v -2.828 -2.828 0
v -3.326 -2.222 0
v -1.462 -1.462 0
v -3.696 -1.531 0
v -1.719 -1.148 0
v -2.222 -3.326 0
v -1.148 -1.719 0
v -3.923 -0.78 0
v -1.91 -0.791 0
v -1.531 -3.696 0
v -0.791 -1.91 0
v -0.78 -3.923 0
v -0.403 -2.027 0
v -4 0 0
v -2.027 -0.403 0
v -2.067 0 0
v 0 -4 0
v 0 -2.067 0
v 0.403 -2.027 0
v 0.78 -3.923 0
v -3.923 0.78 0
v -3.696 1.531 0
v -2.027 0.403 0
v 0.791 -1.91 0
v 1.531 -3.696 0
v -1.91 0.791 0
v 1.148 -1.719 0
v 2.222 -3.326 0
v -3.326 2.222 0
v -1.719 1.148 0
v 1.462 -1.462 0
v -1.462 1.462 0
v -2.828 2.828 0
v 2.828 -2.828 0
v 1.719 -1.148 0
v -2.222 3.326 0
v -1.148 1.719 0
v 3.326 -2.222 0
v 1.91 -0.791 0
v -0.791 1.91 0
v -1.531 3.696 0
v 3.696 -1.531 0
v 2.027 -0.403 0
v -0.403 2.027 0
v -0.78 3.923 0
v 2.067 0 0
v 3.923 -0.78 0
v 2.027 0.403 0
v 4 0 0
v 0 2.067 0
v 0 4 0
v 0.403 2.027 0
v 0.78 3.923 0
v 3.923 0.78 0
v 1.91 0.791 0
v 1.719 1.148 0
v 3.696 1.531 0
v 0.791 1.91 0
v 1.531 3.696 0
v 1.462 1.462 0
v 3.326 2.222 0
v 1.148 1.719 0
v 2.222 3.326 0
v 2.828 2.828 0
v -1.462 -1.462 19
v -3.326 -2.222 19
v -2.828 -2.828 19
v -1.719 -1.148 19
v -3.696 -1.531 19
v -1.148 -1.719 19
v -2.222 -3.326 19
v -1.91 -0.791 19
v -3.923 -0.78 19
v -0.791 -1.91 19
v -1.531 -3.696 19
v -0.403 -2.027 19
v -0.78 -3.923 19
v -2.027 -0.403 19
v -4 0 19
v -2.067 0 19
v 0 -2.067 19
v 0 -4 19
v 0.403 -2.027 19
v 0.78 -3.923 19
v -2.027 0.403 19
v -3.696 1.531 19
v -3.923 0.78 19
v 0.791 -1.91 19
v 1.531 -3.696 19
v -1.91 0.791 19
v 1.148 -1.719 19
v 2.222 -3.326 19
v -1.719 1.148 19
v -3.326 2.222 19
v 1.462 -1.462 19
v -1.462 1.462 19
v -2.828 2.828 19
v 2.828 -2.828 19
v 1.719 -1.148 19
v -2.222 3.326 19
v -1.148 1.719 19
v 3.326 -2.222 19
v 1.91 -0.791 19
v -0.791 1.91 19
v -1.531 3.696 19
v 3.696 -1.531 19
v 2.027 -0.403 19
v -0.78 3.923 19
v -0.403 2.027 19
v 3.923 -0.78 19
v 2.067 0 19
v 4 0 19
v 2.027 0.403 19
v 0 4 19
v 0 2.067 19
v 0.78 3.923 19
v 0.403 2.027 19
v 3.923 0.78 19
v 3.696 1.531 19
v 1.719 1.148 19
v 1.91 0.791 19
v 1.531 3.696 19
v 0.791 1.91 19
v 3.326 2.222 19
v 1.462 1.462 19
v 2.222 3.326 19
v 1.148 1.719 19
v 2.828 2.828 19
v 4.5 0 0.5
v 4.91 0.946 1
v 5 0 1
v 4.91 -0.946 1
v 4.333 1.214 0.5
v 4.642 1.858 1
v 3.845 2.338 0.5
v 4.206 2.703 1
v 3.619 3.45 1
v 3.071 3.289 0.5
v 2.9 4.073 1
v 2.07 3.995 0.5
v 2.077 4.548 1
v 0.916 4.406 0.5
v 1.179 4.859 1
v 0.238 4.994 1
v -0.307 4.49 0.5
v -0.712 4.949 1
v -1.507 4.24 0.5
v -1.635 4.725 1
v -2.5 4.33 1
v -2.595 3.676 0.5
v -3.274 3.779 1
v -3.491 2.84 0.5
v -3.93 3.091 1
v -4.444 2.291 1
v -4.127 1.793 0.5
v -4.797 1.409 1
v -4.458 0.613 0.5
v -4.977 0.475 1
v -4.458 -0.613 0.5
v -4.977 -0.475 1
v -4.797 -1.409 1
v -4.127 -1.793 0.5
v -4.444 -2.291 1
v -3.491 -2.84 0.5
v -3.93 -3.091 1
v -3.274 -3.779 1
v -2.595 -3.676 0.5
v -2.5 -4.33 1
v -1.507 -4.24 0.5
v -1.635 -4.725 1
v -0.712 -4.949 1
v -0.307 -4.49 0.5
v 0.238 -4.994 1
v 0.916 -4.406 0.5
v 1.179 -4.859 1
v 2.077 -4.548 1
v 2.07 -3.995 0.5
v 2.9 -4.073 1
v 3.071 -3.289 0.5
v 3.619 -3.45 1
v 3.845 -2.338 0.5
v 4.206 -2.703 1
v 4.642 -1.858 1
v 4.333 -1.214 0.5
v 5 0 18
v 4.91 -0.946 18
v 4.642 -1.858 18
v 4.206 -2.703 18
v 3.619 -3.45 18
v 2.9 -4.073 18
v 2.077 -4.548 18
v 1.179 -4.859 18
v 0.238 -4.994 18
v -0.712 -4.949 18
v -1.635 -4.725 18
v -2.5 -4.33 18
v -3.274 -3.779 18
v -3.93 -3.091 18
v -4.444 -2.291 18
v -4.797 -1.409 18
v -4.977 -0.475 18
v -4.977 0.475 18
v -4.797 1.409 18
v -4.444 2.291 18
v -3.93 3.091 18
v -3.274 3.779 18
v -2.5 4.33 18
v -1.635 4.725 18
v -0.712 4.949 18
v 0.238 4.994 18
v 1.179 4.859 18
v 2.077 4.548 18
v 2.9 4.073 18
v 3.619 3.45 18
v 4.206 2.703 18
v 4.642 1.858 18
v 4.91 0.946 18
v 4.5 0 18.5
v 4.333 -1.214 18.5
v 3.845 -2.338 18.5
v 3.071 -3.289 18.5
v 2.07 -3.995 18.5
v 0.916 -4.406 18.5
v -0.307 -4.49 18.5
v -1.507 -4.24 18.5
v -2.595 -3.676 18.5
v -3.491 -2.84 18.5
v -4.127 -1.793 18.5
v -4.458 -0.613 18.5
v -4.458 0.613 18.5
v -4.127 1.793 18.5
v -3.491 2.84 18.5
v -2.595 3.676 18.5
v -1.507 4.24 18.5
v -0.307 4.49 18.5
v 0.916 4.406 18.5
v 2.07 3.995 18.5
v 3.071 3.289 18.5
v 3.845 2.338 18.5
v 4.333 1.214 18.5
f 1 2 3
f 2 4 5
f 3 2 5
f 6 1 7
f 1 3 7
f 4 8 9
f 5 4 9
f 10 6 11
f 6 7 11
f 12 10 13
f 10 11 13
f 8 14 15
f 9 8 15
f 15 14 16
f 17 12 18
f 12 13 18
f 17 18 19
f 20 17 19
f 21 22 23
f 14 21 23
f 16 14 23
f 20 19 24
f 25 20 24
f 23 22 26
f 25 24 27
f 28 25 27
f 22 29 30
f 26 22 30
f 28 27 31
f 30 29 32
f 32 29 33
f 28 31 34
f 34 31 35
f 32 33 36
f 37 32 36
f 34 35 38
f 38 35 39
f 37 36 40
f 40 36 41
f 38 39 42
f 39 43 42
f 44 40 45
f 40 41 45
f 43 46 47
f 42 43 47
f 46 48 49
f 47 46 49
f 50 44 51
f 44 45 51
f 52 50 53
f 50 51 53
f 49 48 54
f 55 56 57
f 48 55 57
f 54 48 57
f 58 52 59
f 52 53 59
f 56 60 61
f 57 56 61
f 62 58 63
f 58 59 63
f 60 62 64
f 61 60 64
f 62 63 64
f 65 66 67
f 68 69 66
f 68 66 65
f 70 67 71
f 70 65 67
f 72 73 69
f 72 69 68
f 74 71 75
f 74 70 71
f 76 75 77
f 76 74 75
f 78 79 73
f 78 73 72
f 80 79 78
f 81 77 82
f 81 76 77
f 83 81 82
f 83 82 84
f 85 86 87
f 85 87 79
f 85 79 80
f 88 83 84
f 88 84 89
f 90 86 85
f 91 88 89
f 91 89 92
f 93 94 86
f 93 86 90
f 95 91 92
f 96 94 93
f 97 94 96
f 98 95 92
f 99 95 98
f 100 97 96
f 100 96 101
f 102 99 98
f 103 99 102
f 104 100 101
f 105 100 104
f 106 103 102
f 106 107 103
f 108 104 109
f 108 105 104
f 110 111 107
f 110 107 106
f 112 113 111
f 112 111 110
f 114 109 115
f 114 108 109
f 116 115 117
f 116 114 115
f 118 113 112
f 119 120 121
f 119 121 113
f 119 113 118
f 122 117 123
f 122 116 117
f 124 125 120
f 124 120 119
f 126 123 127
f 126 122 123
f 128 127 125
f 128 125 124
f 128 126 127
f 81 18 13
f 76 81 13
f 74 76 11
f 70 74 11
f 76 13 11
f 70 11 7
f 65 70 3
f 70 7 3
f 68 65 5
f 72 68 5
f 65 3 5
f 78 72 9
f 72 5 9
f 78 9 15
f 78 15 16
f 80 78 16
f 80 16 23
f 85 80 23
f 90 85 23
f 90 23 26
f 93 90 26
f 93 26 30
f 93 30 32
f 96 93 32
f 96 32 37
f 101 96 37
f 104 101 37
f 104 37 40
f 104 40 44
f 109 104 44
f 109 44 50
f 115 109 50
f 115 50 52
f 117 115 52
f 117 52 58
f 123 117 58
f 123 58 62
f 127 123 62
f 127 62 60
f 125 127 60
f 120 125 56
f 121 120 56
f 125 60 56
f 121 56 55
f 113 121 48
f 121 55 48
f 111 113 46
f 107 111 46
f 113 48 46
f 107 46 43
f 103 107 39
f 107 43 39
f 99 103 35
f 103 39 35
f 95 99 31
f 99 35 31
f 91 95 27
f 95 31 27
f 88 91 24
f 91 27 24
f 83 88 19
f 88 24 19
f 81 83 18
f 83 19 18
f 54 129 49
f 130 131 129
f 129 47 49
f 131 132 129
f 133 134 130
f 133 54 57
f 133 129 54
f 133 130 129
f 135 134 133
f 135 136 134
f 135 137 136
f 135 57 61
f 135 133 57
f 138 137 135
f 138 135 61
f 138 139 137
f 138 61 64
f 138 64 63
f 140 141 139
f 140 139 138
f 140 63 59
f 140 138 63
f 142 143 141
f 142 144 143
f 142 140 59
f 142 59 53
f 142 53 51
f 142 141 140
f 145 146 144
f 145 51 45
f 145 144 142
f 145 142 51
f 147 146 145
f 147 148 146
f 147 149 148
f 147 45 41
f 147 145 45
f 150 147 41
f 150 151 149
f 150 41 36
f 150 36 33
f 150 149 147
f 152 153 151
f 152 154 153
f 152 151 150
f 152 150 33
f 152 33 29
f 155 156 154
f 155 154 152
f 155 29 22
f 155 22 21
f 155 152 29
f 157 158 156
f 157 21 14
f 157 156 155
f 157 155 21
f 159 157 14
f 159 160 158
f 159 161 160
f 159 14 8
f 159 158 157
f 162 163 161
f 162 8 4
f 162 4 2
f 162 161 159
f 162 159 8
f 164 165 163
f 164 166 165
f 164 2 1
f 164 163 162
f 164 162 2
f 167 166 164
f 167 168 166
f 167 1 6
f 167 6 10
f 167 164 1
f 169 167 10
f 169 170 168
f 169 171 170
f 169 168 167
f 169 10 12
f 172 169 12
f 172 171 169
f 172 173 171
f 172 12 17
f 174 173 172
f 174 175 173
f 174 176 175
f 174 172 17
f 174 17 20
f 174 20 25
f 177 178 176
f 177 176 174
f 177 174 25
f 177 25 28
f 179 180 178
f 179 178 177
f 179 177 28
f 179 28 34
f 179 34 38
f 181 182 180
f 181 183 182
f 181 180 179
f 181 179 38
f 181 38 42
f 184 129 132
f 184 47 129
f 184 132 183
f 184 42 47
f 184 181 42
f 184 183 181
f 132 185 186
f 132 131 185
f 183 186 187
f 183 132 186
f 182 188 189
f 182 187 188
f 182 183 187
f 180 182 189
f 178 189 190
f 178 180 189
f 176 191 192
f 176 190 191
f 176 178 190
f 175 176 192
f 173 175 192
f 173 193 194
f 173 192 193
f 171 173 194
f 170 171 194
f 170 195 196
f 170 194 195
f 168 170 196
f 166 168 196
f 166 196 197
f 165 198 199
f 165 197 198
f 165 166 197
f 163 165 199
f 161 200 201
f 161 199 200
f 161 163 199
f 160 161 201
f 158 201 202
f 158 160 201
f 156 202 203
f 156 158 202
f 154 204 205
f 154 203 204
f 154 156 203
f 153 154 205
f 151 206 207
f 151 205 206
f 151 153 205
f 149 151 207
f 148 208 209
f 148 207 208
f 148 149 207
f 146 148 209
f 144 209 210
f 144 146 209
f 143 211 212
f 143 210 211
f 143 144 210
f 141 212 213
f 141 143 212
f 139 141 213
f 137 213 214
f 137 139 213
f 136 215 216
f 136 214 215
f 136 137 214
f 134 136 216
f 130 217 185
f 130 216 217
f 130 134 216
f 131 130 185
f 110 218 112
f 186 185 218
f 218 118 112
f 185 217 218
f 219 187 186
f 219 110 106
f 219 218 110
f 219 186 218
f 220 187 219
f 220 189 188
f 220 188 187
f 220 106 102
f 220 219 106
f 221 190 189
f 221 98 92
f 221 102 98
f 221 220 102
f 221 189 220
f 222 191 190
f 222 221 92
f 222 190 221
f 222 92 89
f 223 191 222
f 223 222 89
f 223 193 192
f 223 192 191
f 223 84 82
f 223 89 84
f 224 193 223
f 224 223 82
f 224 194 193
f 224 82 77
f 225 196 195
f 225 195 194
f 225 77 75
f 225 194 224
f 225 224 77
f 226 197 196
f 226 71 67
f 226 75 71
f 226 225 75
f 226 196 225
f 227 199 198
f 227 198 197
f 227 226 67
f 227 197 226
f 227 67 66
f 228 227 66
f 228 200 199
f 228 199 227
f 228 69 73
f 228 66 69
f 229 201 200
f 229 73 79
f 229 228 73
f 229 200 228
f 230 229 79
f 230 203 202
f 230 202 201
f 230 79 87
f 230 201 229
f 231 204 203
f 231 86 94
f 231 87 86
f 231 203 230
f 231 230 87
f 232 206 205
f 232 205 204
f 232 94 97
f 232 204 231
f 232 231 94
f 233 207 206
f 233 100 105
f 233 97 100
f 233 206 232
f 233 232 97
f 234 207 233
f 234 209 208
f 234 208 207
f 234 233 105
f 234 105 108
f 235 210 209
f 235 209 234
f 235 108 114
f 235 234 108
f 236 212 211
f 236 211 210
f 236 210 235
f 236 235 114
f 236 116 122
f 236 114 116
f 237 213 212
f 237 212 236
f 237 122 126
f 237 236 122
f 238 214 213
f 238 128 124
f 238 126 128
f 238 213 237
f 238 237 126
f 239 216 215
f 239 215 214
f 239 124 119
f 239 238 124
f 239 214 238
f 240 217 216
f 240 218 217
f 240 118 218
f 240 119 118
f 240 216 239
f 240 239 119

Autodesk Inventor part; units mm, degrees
ref_plane "YZ Plane" through (0, 0, 0) normal (1, 0, 0) x (0, 1, 0)
ref_plane "XZ Plane" through (0, 0, 0) normal (0, 1, 0) x (-1, 0, 0)
ref_plane "XY Plane" through (0, 0, 0) normal (0, 0, 1) x (1, 0, 0)
sketch "Sketch5" plane through (0, 0, 0) normal (0, 0, 1) x (1, 0, 0)
  circle A0 centre (0, 0) radius 5
  dimension "d8" = 10
extrude "Extrusion5" add sketch "Sketch5" along normal blind 19
hole "Hole2" at (0, 0, 19) direction (0, 0, -1) diameter 4.134 end through all thread size "M5x0.8" class "6H" standard "ANSI Metric M Profile"
chamfer "Chamfer1" distance 1 angle 45 2 edges at (-5, 0, 19) (-5, 0, 0)
properties part number "BC-10026" material "Aço Carbono VC131"
